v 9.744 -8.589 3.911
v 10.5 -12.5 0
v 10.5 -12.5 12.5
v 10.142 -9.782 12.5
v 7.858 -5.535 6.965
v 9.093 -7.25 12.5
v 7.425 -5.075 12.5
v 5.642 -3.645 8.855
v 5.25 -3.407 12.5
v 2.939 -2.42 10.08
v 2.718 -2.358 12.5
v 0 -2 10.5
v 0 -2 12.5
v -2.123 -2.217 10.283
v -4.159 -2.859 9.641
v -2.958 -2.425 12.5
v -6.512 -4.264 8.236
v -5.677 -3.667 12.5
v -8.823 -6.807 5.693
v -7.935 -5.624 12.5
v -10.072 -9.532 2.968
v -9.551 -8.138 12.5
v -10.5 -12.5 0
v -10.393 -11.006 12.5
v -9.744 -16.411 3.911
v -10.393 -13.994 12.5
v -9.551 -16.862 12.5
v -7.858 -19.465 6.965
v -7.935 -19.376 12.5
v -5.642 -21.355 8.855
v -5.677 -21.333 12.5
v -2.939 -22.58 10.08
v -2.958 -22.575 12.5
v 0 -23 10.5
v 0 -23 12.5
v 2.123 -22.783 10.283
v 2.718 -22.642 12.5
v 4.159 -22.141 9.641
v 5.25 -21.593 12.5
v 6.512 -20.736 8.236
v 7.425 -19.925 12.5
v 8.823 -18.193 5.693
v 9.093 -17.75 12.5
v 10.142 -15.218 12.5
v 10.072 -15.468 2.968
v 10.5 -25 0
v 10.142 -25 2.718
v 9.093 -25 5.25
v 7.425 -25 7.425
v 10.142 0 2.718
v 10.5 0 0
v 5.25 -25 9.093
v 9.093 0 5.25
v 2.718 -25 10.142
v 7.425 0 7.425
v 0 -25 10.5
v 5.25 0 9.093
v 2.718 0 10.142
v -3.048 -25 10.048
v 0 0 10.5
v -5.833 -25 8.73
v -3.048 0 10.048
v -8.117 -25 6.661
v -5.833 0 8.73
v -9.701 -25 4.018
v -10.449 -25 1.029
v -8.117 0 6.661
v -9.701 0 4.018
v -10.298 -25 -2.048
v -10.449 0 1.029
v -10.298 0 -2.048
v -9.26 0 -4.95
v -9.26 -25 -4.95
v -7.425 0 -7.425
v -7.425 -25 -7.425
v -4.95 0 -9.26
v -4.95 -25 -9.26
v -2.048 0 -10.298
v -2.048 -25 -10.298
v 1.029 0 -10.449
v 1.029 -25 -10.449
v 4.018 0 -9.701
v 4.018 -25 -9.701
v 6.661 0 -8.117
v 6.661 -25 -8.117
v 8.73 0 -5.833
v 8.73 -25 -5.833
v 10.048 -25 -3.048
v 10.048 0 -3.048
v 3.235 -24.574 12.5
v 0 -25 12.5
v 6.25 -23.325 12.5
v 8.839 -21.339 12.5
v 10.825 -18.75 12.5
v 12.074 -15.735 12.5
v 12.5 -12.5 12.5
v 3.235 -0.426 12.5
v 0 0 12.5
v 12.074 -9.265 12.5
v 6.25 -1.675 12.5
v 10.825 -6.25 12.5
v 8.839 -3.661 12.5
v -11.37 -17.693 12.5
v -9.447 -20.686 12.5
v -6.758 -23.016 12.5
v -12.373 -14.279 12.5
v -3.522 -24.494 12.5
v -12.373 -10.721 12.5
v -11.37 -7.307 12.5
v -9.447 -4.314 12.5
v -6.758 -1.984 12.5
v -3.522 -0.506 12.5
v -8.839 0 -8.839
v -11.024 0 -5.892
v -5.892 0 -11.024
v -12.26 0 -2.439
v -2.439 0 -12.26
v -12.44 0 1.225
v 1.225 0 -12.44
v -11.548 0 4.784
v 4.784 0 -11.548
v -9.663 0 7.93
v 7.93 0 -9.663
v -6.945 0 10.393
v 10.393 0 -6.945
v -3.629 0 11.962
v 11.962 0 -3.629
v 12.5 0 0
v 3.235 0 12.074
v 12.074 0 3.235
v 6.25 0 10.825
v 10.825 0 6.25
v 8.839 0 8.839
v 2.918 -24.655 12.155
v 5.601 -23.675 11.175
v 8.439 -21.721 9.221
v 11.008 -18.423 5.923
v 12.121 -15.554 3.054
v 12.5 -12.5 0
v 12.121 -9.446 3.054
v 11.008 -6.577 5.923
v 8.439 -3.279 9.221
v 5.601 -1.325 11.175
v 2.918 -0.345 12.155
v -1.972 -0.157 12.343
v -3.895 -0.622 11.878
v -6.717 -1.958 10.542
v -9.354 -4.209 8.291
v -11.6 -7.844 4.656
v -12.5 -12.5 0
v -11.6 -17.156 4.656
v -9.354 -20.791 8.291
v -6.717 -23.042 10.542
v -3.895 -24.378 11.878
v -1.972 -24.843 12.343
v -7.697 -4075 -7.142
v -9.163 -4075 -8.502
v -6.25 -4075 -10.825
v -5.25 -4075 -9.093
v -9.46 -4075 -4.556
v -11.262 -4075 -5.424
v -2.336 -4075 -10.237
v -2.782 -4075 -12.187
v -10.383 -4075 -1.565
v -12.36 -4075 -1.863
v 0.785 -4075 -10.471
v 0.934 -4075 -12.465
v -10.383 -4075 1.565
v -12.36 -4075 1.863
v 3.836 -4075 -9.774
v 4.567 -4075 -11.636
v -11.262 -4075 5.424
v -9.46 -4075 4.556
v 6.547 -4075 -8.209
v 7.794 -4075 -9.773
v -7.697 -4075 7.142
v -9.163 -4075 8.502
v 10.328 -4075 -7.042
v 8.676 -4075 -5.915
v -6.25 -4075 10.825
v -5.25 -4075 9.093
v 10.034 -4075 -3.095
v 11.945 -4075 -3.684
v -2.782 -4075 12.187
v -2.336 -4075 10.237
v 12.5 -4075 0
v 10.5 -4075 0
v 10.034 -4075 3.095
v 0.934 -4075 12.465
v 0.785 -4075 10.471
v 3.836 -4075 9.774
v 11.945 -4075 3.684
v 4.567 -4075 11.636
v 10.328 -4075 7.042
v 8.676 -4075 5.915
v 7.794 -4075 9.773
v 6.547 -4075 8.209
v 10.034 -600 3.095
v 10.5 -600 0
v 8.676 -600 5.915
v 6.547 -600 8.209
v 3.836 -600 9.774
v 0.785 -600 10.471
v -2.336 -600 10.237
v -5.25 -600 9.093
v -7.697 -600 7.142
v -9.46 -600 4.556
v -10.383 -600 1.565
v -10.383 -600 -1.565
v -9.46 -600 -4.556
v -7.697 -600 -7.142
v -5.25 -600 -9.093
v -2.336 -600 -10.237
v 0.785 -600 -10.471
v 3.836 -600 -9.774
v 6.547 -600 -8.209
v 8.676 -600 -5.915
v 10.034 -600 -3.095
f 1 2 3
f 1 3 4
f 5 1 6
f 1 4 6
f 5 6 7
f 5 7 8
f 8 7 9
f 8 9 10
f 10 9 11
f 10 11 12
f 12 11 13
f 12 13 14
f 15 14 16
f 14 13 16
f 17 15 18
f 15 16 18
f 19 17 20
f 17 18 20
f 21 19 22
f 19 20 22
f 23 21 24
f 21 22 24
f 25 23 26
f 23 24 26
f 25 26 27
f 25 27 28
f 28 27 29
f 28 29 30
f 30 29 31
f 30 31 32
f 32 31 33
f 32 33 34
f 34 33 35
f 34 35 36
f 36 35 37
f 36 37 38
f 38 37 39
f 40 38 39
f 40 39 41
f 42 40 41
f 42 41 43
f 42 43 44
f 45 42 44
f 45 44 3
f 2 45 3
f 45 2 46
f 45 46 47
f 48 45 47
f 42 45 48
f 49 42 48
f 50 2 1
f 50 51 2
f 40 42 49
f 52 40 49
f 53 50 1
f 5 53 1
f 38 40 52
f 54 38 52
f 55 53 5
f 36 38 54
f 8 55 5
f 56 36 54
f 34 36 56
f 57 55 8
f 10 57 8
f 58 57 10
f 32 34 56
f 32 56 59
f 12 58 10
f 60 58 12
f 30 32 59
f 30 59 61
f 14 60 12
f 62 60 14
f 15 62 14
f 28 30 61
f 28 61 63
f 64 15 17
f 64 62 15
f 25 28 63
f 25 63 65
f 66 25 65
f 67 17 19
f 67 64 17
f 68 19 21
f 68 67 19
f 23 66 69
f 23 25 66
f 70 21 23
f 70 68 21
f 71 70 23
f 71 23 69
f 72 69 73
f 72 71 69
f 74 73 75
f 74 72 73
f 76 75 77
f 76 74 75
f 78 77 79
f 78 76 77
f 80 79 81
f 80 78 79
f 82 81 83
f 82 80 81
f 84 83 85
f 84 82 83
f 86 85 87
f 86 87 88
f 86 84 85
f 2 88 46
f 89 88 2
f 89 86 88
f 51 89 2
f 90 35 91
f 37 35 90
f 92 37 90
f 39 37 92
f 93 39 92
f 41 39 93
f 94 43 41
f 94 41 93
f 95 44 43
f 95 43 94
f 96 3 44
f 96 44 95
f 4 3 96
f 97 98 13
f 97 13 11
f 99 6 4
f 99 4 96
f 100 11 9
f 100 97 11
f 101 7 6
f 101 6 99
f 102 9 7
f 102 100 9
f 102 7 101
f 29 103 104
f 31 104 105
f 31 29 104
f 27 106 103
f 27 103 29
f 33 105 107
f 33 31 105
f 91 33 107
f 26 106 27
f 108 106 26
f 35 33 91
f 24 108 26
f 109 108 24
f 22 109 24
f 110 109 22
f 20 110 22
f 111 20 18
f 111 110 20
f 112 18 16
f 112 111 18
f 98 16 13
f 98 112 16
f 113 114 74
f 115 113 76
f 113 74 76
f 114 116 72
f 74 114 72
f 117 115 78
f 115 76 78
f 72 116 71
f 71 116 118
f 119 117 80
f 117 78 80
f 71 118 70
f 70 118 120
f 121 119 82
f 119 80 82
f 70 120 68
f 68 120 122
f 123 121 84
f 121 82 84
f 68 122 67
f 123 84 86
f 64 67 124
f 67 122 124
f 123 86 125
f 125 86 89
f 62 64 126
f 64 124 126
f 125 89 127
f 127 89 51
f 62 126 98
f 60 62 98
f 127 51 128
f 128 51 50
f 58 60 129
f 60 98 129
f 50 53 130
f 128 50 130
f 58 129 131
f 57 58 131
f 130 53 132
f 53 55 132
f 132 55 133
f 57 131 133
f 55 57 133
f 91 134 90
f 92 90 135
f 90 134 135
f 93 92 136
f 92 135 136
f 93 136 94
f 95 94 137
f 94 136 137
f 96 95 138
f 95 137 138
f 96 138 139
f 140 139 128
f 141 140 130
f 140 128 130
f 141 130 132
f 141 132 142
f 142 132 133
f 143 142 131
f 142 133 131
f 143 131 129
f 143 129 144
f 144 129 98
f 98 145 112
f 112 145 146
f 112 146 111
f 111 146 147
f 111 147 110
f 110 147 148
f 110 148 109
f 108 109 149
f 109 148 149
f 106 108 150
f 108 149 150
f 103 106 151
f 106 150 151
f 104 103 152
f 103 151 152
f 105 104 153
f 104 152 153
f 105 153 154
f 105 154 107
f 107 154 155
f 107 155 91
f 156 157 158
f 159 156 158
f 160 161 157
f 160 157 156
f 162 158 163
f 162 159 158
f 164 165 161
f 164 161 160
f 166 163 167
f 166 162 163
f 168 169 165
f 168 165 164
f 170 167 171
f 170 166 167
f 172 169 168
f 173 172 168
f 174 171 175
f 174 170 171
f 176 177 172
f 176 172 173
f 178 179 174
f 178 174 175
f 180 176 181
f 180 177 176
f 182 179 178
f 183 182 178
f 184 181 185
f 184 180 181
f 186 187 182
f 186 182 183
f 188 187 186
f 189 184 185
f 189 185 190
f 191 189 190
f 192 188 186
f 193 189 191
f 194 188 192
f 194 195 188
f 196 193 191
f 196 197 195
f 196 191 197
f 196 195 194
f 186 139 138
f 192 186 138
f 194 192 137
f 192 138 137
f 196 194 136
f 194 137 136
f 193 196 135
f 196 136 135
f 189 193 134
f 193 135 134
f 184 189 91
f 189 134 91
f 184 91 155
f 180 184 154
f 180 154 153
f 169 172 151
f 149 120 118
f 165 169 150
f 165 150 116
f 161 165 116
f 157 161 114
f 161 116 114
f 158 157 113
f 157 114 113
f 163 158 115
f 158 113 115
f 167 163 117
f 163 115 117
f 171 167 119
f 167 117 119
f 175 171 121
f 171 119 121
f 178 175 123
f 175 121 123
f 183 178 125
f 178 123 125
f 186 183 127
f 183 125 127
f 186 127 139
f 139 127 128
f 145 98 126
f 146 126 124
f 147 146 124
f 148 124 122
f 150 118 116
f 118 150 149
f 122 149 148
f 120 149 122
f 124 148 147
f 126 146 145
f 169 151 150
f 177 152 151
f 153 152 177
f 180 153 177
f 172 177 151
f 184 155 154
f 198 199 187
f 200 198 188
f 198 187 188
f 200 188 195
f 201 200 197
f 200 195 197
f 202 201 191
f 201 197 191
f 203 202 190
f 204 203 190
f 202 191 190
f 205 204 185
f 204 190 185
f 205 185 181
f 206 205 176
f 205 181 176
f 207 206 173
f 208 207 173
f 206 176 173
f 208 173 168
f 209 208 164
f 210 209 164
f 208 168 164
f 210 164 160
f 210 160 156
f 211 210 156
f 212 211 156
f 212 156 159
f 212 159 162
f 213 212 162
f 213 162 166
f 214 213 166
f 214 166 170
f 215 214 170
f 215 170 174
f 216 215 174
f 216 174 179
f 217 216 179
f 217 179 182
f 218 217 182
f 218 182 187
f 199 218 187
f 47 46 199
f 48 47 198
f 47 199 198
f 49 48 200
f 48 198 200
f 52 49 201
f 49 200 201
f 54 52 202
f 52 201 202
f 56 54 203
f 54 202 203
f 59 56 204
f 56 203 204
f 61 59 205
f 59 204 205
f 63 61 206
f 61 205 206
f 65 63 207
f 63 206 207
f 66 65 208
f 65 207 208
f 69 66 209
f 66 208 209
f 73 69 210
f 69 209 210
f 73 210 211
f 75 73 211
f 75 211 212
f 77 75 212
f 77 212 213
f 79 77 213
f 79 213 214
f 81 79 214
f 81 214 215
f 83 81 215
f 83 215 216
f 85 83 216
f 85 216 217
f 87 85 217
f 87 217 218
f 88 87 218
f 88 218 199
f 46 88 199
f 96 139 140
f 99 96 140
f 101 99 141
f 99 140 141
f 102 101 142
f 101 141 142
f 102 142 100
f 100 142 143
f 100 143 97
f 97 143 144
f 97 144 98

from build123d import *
from build123d import SkipClean  # not in build123d's __all__

# Parameters (mm, degrees)
F0_R     = 12.5
F1_DEPTH = 4075
F2_R     = 10.5
F3_DEPTH = 4050
F4_R     = 12.5
F5_DEPTH = 12.5
F6_R     = 10.5
F7_DEPTH = 12.5
F8_R     = 10.5
F9_DEPTH = 600


with BuildPart() as f1:
    # F0 (on Front) → F1 (new body)
    with BuildSketch(Plane.XZ):
        Circle(F0_R)
    extrude(amount=F1_DEPTH)

    # F2 (on face) → F3 (cut)
    with BuildSketch(Plane.XZ.offset(4075)):
        Circle(F2_R)
    extrude(amount=-F3_DEPTH, mode=Mode.SUBTRACT)

    # F4 (on Top) → F5 (join)
    with BuildSketch(Plane.XY):
        with Locations((0, -12.5)):
            Circle(F4_R)
    with SkipClean():  # cleaning this boolean's faces spoils the solid; the shape is the same uncleaned
        extrude(amount=F5_DEPTH)

    # F6 (on face) → F7 (cut)
    with BuildSketch(Plane.XY.offset(12.5)):
        with Locations((0, -12.5)):
            Circle(F6_R)
    with SkipClean():  # cleaning this boolean's faces spoils the solid; the shape is the same uncleaned
        extrude(amount=-F7_DEPTH, mode=Mode.SUBTRACT)

    # F8 (on Front) → F9 (cut)
    with BuildSketch(Plane.XZ):
        Circle(F8_R)
    with SkipClean():  # cleaning this boolean's faces spoils the solid; the shape is the same uncleaned
        extrude(amount=F9_DEPTH, mode=Mode.SUBTRACT)


solid = f1.part
